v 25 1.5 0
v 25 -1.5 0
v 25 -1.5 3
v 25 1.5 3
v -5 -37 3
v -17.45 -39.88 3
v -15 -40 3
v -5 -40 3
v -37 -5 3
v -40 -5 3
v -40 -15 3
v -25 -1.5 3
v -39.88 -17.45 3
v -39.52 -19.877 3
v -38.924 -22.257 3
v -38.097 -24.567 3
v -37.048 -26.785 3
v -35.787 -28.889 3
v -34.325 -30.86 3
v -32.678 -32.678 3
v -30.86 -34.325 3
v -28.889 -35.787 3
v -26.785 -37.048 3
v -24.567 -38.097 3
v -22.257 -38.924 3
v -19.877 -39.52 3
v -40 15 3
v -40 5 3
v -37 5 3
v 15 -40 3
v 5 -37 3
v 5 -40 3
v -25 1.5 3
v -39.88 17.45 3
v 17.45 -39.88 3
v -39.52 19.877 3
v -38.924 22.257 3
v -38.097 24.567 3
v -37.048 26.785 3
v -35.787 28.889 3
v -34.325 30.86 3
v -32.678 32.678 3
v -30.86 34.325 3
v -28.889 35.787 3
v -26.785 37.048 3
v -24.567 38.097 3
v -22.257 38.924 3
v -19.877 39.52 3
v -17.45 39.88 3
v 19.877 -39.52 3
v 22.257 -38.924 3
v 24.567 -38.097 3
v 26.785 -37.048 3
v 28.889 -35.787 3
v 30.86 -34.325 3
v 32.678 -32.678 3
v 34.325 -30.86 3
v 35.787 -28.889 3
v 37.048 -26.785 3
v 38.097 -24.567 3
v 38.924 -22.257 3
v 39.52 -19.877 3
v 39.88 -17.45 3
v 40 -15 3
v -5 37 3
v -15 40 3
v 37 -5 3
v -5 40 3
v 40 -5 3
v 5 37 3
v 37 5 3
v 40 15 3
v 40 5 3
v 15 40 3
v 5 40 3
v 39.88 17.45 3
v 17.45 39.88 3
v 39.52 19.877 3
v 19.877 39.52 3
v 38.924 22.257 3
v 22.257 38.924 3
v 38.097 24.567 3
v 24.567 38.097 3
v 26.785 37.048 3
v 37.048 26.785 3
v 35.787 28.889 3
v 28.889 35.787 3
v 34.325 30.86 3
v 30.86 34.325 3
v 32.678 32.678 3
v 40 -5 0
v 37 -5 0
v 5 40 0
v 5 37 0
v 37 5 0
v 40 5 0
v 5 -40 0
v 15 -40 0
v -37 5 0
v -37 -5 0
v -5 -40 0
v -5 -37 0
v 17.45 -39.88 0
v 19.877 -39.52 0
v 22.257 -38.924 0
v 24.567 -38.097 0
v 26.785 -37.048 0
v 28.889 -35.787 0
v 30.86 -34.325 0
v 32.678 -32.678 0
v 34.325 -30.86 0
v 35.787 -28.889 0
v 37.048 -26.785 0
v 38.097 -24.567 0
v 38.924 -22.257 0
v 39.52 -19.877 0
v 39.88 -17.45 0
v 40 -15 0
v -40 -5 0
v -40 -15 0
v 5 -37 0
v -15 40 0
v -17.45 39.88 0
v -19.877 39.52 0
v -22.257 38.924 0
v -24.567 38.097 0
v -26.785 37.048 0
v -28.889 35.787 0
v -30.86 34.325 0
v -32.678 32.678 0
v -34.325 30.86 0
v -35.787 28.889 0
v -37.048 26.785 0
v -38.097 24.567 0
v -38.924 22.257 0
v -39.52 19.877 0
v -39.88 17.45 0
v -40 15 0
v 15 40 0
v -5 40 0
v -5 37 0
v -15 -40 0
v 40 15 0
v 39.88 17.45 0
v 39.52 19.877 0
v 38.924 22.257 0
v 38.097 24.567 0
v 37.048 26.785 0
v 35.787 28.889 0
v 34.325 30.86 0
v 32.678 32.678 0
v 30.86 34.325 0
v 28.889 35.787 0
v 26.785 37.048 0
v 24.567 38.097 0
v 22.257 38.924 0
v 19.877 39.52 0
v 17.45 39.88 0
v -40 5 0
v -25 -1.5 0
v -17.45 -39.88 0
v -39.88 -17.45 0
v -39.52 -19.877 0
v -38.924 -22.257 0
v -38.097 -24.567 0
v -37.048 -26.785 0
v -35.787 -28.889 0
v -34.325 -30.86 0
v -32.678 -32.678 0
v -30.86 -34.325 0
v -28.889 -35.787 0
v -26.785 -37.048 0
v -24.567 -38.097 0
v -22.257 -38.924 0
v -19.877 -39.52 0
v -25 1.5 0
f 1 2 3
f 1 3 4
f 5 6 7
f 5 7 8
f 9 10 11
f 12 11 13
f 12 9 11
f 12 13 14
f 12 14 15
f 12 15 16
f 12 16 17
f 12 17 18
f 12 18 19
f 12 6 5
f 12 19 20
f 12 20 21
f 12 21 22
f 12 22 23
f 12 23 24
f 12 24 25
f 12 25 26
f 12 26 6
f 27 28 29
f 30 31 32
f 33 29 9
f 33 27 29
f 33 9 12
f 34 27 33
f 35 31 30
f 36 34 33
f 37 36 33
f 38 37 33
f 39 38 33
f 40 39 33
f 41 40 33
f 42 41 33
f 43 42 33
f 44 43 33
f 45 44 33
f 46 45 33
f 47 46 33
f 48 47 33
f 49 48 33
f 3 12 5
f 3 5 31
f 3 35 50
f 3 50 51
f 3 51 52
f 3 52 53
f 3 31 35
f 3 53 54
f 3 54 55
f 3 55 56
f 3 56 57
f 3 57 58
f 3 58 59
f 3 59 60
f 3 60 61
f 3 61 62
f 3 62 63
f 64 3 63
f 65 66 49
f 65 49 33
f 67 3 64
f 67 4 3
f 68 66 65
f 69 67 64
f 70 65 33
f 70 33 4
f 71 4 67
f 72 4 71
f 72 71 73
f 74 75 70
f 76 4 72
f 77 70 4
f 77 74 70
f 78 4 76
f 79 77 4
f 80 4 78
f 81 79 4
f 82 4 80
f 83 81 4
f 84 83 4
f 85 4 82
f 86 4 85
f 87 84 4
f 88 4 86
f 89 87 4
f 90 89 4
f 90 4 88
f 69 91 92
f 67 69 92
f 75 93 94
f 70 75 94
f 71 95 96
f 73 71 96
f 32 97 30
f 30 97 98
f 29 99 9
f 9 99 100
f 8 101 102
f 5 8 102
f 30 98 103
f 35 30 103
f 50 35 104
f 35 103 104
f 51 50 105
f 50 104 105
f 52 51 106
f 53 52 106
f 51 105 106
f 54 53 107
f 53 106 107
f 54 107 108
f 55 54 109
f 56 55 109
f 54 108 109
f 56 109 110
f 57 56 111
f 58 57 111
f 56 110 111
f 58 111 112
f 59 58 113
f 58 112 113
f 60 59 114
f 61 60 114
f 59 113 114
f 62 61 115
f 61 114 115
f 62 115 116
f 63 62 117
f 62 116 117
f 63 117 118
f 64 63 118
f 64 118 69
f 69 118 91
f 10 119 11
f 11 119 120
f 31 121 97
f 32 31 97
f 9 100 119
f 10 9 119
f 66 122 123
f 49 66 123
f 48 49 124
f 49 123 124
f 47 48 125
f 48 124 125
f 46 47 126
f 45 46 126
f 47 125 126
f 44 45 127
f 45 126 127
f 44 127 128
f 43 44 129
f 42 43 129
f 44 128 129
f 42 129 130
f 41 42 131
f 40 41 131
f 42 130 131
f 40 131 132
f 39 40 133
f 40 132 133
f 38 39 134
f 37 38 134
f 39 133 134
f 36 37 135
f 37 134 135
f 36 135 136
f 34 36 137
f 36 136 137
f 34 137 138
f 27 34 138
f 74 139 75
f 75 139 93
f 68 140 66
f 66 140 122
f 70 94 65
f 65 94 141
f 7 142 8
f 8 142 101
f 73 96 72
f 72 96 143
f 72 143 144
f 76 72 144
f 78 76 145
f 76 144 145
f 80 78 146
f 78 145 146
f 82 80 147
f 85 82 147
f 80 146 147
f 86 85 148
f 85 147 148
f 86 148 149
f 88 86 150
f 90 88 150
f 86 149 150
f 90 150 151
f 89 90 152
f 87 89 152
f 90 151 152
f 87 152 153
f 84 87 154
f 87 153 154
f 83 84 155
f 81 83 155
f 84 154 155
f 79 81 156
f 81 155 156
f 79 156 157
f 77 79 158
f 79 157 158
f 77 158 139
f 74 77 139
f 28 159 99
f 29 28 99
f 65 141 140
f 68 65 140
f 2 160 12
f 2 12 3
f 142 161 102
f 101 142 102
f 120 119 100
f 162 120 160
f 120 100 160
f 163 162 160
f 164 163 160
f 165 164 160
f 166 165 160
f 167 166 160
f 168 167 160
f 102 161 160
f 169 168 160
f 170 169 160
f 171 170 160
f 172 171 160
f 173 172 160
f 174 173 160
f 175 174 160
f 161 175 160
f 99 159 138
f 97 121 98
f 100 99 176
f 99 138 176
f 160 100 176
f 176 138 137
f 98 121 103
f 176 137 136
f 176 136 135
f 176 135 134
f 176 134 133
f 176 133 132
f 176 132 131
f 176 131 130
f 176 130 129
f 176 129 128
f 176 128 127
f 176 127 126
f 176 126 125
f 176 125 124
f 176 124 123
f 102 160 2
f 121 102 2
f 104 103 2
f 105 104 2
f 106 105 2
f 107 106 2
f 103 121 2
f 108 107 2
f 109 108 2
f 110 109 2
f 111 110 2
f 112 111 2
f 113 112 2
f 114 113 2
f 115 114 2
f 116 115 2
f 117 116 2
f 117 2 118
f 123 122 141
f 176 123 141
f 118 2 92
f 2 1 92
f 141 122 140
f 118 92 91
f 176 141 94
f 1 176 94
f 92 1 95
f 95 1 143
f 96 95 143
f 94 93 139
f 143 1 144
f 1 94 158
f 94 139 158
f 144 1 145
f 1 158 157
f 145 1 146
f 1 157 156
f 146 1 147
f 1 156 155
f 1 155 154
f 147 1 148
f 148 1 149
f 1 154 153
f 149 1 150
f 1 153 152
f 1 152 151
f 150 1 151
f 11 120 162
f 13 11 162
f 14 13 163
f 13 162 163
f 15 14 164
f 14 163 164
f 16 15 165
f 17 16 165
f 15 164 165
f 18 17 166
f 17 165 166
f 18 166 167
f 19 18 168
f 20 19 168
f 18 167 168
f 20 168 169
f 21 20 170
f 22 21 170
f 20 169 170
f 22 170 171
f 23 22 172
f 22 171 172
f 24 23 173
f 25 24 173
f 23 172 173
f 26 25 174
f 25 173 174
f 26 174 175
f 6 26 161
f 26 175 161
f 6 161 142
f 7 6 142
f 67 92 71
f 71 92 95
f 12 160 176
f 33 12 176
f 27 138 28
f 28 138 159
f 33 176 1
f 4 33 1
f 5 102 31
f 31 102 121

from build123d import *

# Parameters (mm, degrees)
SKETCH_1_W      = 50
SKETCH_1_H      = 3
EXTRUDE_1_DEPTH = 3


with BuildPart() as part:
    # 草圖1 → 填料-伸長1 (new body)
    with BuildSketch(Plane.XY):
        with BuildLine():
            Line((-5, 40), (-15, 40))
            ThreePointArc((-15, 40), (-32.67766953, 32.67766953), (-40, 15))
            Line((-40, 15), (-40, 5))
            Line((-40, 5), (-37, 5))
            Line((-37, 5), (-37, -5))
            Line((-37, -5), (-40, -5))
            Line((-40, -5), (-40, -15))
            ThreePointArc((-40, -15), (-32.67766953, -32.67766953), (-15, -40))
            Line((-15, -40), (-5, -40))
            Line((-5, -40), (-5, -37))
            Line((-5, -37), (5, -37))
            Line((5, -37), (5, -40))
            Line((5, -40), (15, -40))
            ThreePointArc((15, -40), (32.67766953, -32.67766953), (40, -15))
            Line((40, -15), (40, -5))
            Line((40, -5), (37, -5))
            Line((37, -5), (37, 5))
            Line((37, 5), (40, 5))
            Line((40, 5), (40, 15))
            ThreePointArc((40, 15), (32.67766953, 32.67766953), (15, 40))
            Line((15, 40), (5, 40))
            Line((5, 40), (5, 37))
            Line((5, 37), (-5, 37))
            Line((-5, 37), (-5, 40))
        make_face()
        Rectangle(SKETCH_1_W, SKETCH_1_H, mode=Mode.SUBTRACT)
    extrude(amount=EXTRUDE_1_DEPTH)


solid = part.part
